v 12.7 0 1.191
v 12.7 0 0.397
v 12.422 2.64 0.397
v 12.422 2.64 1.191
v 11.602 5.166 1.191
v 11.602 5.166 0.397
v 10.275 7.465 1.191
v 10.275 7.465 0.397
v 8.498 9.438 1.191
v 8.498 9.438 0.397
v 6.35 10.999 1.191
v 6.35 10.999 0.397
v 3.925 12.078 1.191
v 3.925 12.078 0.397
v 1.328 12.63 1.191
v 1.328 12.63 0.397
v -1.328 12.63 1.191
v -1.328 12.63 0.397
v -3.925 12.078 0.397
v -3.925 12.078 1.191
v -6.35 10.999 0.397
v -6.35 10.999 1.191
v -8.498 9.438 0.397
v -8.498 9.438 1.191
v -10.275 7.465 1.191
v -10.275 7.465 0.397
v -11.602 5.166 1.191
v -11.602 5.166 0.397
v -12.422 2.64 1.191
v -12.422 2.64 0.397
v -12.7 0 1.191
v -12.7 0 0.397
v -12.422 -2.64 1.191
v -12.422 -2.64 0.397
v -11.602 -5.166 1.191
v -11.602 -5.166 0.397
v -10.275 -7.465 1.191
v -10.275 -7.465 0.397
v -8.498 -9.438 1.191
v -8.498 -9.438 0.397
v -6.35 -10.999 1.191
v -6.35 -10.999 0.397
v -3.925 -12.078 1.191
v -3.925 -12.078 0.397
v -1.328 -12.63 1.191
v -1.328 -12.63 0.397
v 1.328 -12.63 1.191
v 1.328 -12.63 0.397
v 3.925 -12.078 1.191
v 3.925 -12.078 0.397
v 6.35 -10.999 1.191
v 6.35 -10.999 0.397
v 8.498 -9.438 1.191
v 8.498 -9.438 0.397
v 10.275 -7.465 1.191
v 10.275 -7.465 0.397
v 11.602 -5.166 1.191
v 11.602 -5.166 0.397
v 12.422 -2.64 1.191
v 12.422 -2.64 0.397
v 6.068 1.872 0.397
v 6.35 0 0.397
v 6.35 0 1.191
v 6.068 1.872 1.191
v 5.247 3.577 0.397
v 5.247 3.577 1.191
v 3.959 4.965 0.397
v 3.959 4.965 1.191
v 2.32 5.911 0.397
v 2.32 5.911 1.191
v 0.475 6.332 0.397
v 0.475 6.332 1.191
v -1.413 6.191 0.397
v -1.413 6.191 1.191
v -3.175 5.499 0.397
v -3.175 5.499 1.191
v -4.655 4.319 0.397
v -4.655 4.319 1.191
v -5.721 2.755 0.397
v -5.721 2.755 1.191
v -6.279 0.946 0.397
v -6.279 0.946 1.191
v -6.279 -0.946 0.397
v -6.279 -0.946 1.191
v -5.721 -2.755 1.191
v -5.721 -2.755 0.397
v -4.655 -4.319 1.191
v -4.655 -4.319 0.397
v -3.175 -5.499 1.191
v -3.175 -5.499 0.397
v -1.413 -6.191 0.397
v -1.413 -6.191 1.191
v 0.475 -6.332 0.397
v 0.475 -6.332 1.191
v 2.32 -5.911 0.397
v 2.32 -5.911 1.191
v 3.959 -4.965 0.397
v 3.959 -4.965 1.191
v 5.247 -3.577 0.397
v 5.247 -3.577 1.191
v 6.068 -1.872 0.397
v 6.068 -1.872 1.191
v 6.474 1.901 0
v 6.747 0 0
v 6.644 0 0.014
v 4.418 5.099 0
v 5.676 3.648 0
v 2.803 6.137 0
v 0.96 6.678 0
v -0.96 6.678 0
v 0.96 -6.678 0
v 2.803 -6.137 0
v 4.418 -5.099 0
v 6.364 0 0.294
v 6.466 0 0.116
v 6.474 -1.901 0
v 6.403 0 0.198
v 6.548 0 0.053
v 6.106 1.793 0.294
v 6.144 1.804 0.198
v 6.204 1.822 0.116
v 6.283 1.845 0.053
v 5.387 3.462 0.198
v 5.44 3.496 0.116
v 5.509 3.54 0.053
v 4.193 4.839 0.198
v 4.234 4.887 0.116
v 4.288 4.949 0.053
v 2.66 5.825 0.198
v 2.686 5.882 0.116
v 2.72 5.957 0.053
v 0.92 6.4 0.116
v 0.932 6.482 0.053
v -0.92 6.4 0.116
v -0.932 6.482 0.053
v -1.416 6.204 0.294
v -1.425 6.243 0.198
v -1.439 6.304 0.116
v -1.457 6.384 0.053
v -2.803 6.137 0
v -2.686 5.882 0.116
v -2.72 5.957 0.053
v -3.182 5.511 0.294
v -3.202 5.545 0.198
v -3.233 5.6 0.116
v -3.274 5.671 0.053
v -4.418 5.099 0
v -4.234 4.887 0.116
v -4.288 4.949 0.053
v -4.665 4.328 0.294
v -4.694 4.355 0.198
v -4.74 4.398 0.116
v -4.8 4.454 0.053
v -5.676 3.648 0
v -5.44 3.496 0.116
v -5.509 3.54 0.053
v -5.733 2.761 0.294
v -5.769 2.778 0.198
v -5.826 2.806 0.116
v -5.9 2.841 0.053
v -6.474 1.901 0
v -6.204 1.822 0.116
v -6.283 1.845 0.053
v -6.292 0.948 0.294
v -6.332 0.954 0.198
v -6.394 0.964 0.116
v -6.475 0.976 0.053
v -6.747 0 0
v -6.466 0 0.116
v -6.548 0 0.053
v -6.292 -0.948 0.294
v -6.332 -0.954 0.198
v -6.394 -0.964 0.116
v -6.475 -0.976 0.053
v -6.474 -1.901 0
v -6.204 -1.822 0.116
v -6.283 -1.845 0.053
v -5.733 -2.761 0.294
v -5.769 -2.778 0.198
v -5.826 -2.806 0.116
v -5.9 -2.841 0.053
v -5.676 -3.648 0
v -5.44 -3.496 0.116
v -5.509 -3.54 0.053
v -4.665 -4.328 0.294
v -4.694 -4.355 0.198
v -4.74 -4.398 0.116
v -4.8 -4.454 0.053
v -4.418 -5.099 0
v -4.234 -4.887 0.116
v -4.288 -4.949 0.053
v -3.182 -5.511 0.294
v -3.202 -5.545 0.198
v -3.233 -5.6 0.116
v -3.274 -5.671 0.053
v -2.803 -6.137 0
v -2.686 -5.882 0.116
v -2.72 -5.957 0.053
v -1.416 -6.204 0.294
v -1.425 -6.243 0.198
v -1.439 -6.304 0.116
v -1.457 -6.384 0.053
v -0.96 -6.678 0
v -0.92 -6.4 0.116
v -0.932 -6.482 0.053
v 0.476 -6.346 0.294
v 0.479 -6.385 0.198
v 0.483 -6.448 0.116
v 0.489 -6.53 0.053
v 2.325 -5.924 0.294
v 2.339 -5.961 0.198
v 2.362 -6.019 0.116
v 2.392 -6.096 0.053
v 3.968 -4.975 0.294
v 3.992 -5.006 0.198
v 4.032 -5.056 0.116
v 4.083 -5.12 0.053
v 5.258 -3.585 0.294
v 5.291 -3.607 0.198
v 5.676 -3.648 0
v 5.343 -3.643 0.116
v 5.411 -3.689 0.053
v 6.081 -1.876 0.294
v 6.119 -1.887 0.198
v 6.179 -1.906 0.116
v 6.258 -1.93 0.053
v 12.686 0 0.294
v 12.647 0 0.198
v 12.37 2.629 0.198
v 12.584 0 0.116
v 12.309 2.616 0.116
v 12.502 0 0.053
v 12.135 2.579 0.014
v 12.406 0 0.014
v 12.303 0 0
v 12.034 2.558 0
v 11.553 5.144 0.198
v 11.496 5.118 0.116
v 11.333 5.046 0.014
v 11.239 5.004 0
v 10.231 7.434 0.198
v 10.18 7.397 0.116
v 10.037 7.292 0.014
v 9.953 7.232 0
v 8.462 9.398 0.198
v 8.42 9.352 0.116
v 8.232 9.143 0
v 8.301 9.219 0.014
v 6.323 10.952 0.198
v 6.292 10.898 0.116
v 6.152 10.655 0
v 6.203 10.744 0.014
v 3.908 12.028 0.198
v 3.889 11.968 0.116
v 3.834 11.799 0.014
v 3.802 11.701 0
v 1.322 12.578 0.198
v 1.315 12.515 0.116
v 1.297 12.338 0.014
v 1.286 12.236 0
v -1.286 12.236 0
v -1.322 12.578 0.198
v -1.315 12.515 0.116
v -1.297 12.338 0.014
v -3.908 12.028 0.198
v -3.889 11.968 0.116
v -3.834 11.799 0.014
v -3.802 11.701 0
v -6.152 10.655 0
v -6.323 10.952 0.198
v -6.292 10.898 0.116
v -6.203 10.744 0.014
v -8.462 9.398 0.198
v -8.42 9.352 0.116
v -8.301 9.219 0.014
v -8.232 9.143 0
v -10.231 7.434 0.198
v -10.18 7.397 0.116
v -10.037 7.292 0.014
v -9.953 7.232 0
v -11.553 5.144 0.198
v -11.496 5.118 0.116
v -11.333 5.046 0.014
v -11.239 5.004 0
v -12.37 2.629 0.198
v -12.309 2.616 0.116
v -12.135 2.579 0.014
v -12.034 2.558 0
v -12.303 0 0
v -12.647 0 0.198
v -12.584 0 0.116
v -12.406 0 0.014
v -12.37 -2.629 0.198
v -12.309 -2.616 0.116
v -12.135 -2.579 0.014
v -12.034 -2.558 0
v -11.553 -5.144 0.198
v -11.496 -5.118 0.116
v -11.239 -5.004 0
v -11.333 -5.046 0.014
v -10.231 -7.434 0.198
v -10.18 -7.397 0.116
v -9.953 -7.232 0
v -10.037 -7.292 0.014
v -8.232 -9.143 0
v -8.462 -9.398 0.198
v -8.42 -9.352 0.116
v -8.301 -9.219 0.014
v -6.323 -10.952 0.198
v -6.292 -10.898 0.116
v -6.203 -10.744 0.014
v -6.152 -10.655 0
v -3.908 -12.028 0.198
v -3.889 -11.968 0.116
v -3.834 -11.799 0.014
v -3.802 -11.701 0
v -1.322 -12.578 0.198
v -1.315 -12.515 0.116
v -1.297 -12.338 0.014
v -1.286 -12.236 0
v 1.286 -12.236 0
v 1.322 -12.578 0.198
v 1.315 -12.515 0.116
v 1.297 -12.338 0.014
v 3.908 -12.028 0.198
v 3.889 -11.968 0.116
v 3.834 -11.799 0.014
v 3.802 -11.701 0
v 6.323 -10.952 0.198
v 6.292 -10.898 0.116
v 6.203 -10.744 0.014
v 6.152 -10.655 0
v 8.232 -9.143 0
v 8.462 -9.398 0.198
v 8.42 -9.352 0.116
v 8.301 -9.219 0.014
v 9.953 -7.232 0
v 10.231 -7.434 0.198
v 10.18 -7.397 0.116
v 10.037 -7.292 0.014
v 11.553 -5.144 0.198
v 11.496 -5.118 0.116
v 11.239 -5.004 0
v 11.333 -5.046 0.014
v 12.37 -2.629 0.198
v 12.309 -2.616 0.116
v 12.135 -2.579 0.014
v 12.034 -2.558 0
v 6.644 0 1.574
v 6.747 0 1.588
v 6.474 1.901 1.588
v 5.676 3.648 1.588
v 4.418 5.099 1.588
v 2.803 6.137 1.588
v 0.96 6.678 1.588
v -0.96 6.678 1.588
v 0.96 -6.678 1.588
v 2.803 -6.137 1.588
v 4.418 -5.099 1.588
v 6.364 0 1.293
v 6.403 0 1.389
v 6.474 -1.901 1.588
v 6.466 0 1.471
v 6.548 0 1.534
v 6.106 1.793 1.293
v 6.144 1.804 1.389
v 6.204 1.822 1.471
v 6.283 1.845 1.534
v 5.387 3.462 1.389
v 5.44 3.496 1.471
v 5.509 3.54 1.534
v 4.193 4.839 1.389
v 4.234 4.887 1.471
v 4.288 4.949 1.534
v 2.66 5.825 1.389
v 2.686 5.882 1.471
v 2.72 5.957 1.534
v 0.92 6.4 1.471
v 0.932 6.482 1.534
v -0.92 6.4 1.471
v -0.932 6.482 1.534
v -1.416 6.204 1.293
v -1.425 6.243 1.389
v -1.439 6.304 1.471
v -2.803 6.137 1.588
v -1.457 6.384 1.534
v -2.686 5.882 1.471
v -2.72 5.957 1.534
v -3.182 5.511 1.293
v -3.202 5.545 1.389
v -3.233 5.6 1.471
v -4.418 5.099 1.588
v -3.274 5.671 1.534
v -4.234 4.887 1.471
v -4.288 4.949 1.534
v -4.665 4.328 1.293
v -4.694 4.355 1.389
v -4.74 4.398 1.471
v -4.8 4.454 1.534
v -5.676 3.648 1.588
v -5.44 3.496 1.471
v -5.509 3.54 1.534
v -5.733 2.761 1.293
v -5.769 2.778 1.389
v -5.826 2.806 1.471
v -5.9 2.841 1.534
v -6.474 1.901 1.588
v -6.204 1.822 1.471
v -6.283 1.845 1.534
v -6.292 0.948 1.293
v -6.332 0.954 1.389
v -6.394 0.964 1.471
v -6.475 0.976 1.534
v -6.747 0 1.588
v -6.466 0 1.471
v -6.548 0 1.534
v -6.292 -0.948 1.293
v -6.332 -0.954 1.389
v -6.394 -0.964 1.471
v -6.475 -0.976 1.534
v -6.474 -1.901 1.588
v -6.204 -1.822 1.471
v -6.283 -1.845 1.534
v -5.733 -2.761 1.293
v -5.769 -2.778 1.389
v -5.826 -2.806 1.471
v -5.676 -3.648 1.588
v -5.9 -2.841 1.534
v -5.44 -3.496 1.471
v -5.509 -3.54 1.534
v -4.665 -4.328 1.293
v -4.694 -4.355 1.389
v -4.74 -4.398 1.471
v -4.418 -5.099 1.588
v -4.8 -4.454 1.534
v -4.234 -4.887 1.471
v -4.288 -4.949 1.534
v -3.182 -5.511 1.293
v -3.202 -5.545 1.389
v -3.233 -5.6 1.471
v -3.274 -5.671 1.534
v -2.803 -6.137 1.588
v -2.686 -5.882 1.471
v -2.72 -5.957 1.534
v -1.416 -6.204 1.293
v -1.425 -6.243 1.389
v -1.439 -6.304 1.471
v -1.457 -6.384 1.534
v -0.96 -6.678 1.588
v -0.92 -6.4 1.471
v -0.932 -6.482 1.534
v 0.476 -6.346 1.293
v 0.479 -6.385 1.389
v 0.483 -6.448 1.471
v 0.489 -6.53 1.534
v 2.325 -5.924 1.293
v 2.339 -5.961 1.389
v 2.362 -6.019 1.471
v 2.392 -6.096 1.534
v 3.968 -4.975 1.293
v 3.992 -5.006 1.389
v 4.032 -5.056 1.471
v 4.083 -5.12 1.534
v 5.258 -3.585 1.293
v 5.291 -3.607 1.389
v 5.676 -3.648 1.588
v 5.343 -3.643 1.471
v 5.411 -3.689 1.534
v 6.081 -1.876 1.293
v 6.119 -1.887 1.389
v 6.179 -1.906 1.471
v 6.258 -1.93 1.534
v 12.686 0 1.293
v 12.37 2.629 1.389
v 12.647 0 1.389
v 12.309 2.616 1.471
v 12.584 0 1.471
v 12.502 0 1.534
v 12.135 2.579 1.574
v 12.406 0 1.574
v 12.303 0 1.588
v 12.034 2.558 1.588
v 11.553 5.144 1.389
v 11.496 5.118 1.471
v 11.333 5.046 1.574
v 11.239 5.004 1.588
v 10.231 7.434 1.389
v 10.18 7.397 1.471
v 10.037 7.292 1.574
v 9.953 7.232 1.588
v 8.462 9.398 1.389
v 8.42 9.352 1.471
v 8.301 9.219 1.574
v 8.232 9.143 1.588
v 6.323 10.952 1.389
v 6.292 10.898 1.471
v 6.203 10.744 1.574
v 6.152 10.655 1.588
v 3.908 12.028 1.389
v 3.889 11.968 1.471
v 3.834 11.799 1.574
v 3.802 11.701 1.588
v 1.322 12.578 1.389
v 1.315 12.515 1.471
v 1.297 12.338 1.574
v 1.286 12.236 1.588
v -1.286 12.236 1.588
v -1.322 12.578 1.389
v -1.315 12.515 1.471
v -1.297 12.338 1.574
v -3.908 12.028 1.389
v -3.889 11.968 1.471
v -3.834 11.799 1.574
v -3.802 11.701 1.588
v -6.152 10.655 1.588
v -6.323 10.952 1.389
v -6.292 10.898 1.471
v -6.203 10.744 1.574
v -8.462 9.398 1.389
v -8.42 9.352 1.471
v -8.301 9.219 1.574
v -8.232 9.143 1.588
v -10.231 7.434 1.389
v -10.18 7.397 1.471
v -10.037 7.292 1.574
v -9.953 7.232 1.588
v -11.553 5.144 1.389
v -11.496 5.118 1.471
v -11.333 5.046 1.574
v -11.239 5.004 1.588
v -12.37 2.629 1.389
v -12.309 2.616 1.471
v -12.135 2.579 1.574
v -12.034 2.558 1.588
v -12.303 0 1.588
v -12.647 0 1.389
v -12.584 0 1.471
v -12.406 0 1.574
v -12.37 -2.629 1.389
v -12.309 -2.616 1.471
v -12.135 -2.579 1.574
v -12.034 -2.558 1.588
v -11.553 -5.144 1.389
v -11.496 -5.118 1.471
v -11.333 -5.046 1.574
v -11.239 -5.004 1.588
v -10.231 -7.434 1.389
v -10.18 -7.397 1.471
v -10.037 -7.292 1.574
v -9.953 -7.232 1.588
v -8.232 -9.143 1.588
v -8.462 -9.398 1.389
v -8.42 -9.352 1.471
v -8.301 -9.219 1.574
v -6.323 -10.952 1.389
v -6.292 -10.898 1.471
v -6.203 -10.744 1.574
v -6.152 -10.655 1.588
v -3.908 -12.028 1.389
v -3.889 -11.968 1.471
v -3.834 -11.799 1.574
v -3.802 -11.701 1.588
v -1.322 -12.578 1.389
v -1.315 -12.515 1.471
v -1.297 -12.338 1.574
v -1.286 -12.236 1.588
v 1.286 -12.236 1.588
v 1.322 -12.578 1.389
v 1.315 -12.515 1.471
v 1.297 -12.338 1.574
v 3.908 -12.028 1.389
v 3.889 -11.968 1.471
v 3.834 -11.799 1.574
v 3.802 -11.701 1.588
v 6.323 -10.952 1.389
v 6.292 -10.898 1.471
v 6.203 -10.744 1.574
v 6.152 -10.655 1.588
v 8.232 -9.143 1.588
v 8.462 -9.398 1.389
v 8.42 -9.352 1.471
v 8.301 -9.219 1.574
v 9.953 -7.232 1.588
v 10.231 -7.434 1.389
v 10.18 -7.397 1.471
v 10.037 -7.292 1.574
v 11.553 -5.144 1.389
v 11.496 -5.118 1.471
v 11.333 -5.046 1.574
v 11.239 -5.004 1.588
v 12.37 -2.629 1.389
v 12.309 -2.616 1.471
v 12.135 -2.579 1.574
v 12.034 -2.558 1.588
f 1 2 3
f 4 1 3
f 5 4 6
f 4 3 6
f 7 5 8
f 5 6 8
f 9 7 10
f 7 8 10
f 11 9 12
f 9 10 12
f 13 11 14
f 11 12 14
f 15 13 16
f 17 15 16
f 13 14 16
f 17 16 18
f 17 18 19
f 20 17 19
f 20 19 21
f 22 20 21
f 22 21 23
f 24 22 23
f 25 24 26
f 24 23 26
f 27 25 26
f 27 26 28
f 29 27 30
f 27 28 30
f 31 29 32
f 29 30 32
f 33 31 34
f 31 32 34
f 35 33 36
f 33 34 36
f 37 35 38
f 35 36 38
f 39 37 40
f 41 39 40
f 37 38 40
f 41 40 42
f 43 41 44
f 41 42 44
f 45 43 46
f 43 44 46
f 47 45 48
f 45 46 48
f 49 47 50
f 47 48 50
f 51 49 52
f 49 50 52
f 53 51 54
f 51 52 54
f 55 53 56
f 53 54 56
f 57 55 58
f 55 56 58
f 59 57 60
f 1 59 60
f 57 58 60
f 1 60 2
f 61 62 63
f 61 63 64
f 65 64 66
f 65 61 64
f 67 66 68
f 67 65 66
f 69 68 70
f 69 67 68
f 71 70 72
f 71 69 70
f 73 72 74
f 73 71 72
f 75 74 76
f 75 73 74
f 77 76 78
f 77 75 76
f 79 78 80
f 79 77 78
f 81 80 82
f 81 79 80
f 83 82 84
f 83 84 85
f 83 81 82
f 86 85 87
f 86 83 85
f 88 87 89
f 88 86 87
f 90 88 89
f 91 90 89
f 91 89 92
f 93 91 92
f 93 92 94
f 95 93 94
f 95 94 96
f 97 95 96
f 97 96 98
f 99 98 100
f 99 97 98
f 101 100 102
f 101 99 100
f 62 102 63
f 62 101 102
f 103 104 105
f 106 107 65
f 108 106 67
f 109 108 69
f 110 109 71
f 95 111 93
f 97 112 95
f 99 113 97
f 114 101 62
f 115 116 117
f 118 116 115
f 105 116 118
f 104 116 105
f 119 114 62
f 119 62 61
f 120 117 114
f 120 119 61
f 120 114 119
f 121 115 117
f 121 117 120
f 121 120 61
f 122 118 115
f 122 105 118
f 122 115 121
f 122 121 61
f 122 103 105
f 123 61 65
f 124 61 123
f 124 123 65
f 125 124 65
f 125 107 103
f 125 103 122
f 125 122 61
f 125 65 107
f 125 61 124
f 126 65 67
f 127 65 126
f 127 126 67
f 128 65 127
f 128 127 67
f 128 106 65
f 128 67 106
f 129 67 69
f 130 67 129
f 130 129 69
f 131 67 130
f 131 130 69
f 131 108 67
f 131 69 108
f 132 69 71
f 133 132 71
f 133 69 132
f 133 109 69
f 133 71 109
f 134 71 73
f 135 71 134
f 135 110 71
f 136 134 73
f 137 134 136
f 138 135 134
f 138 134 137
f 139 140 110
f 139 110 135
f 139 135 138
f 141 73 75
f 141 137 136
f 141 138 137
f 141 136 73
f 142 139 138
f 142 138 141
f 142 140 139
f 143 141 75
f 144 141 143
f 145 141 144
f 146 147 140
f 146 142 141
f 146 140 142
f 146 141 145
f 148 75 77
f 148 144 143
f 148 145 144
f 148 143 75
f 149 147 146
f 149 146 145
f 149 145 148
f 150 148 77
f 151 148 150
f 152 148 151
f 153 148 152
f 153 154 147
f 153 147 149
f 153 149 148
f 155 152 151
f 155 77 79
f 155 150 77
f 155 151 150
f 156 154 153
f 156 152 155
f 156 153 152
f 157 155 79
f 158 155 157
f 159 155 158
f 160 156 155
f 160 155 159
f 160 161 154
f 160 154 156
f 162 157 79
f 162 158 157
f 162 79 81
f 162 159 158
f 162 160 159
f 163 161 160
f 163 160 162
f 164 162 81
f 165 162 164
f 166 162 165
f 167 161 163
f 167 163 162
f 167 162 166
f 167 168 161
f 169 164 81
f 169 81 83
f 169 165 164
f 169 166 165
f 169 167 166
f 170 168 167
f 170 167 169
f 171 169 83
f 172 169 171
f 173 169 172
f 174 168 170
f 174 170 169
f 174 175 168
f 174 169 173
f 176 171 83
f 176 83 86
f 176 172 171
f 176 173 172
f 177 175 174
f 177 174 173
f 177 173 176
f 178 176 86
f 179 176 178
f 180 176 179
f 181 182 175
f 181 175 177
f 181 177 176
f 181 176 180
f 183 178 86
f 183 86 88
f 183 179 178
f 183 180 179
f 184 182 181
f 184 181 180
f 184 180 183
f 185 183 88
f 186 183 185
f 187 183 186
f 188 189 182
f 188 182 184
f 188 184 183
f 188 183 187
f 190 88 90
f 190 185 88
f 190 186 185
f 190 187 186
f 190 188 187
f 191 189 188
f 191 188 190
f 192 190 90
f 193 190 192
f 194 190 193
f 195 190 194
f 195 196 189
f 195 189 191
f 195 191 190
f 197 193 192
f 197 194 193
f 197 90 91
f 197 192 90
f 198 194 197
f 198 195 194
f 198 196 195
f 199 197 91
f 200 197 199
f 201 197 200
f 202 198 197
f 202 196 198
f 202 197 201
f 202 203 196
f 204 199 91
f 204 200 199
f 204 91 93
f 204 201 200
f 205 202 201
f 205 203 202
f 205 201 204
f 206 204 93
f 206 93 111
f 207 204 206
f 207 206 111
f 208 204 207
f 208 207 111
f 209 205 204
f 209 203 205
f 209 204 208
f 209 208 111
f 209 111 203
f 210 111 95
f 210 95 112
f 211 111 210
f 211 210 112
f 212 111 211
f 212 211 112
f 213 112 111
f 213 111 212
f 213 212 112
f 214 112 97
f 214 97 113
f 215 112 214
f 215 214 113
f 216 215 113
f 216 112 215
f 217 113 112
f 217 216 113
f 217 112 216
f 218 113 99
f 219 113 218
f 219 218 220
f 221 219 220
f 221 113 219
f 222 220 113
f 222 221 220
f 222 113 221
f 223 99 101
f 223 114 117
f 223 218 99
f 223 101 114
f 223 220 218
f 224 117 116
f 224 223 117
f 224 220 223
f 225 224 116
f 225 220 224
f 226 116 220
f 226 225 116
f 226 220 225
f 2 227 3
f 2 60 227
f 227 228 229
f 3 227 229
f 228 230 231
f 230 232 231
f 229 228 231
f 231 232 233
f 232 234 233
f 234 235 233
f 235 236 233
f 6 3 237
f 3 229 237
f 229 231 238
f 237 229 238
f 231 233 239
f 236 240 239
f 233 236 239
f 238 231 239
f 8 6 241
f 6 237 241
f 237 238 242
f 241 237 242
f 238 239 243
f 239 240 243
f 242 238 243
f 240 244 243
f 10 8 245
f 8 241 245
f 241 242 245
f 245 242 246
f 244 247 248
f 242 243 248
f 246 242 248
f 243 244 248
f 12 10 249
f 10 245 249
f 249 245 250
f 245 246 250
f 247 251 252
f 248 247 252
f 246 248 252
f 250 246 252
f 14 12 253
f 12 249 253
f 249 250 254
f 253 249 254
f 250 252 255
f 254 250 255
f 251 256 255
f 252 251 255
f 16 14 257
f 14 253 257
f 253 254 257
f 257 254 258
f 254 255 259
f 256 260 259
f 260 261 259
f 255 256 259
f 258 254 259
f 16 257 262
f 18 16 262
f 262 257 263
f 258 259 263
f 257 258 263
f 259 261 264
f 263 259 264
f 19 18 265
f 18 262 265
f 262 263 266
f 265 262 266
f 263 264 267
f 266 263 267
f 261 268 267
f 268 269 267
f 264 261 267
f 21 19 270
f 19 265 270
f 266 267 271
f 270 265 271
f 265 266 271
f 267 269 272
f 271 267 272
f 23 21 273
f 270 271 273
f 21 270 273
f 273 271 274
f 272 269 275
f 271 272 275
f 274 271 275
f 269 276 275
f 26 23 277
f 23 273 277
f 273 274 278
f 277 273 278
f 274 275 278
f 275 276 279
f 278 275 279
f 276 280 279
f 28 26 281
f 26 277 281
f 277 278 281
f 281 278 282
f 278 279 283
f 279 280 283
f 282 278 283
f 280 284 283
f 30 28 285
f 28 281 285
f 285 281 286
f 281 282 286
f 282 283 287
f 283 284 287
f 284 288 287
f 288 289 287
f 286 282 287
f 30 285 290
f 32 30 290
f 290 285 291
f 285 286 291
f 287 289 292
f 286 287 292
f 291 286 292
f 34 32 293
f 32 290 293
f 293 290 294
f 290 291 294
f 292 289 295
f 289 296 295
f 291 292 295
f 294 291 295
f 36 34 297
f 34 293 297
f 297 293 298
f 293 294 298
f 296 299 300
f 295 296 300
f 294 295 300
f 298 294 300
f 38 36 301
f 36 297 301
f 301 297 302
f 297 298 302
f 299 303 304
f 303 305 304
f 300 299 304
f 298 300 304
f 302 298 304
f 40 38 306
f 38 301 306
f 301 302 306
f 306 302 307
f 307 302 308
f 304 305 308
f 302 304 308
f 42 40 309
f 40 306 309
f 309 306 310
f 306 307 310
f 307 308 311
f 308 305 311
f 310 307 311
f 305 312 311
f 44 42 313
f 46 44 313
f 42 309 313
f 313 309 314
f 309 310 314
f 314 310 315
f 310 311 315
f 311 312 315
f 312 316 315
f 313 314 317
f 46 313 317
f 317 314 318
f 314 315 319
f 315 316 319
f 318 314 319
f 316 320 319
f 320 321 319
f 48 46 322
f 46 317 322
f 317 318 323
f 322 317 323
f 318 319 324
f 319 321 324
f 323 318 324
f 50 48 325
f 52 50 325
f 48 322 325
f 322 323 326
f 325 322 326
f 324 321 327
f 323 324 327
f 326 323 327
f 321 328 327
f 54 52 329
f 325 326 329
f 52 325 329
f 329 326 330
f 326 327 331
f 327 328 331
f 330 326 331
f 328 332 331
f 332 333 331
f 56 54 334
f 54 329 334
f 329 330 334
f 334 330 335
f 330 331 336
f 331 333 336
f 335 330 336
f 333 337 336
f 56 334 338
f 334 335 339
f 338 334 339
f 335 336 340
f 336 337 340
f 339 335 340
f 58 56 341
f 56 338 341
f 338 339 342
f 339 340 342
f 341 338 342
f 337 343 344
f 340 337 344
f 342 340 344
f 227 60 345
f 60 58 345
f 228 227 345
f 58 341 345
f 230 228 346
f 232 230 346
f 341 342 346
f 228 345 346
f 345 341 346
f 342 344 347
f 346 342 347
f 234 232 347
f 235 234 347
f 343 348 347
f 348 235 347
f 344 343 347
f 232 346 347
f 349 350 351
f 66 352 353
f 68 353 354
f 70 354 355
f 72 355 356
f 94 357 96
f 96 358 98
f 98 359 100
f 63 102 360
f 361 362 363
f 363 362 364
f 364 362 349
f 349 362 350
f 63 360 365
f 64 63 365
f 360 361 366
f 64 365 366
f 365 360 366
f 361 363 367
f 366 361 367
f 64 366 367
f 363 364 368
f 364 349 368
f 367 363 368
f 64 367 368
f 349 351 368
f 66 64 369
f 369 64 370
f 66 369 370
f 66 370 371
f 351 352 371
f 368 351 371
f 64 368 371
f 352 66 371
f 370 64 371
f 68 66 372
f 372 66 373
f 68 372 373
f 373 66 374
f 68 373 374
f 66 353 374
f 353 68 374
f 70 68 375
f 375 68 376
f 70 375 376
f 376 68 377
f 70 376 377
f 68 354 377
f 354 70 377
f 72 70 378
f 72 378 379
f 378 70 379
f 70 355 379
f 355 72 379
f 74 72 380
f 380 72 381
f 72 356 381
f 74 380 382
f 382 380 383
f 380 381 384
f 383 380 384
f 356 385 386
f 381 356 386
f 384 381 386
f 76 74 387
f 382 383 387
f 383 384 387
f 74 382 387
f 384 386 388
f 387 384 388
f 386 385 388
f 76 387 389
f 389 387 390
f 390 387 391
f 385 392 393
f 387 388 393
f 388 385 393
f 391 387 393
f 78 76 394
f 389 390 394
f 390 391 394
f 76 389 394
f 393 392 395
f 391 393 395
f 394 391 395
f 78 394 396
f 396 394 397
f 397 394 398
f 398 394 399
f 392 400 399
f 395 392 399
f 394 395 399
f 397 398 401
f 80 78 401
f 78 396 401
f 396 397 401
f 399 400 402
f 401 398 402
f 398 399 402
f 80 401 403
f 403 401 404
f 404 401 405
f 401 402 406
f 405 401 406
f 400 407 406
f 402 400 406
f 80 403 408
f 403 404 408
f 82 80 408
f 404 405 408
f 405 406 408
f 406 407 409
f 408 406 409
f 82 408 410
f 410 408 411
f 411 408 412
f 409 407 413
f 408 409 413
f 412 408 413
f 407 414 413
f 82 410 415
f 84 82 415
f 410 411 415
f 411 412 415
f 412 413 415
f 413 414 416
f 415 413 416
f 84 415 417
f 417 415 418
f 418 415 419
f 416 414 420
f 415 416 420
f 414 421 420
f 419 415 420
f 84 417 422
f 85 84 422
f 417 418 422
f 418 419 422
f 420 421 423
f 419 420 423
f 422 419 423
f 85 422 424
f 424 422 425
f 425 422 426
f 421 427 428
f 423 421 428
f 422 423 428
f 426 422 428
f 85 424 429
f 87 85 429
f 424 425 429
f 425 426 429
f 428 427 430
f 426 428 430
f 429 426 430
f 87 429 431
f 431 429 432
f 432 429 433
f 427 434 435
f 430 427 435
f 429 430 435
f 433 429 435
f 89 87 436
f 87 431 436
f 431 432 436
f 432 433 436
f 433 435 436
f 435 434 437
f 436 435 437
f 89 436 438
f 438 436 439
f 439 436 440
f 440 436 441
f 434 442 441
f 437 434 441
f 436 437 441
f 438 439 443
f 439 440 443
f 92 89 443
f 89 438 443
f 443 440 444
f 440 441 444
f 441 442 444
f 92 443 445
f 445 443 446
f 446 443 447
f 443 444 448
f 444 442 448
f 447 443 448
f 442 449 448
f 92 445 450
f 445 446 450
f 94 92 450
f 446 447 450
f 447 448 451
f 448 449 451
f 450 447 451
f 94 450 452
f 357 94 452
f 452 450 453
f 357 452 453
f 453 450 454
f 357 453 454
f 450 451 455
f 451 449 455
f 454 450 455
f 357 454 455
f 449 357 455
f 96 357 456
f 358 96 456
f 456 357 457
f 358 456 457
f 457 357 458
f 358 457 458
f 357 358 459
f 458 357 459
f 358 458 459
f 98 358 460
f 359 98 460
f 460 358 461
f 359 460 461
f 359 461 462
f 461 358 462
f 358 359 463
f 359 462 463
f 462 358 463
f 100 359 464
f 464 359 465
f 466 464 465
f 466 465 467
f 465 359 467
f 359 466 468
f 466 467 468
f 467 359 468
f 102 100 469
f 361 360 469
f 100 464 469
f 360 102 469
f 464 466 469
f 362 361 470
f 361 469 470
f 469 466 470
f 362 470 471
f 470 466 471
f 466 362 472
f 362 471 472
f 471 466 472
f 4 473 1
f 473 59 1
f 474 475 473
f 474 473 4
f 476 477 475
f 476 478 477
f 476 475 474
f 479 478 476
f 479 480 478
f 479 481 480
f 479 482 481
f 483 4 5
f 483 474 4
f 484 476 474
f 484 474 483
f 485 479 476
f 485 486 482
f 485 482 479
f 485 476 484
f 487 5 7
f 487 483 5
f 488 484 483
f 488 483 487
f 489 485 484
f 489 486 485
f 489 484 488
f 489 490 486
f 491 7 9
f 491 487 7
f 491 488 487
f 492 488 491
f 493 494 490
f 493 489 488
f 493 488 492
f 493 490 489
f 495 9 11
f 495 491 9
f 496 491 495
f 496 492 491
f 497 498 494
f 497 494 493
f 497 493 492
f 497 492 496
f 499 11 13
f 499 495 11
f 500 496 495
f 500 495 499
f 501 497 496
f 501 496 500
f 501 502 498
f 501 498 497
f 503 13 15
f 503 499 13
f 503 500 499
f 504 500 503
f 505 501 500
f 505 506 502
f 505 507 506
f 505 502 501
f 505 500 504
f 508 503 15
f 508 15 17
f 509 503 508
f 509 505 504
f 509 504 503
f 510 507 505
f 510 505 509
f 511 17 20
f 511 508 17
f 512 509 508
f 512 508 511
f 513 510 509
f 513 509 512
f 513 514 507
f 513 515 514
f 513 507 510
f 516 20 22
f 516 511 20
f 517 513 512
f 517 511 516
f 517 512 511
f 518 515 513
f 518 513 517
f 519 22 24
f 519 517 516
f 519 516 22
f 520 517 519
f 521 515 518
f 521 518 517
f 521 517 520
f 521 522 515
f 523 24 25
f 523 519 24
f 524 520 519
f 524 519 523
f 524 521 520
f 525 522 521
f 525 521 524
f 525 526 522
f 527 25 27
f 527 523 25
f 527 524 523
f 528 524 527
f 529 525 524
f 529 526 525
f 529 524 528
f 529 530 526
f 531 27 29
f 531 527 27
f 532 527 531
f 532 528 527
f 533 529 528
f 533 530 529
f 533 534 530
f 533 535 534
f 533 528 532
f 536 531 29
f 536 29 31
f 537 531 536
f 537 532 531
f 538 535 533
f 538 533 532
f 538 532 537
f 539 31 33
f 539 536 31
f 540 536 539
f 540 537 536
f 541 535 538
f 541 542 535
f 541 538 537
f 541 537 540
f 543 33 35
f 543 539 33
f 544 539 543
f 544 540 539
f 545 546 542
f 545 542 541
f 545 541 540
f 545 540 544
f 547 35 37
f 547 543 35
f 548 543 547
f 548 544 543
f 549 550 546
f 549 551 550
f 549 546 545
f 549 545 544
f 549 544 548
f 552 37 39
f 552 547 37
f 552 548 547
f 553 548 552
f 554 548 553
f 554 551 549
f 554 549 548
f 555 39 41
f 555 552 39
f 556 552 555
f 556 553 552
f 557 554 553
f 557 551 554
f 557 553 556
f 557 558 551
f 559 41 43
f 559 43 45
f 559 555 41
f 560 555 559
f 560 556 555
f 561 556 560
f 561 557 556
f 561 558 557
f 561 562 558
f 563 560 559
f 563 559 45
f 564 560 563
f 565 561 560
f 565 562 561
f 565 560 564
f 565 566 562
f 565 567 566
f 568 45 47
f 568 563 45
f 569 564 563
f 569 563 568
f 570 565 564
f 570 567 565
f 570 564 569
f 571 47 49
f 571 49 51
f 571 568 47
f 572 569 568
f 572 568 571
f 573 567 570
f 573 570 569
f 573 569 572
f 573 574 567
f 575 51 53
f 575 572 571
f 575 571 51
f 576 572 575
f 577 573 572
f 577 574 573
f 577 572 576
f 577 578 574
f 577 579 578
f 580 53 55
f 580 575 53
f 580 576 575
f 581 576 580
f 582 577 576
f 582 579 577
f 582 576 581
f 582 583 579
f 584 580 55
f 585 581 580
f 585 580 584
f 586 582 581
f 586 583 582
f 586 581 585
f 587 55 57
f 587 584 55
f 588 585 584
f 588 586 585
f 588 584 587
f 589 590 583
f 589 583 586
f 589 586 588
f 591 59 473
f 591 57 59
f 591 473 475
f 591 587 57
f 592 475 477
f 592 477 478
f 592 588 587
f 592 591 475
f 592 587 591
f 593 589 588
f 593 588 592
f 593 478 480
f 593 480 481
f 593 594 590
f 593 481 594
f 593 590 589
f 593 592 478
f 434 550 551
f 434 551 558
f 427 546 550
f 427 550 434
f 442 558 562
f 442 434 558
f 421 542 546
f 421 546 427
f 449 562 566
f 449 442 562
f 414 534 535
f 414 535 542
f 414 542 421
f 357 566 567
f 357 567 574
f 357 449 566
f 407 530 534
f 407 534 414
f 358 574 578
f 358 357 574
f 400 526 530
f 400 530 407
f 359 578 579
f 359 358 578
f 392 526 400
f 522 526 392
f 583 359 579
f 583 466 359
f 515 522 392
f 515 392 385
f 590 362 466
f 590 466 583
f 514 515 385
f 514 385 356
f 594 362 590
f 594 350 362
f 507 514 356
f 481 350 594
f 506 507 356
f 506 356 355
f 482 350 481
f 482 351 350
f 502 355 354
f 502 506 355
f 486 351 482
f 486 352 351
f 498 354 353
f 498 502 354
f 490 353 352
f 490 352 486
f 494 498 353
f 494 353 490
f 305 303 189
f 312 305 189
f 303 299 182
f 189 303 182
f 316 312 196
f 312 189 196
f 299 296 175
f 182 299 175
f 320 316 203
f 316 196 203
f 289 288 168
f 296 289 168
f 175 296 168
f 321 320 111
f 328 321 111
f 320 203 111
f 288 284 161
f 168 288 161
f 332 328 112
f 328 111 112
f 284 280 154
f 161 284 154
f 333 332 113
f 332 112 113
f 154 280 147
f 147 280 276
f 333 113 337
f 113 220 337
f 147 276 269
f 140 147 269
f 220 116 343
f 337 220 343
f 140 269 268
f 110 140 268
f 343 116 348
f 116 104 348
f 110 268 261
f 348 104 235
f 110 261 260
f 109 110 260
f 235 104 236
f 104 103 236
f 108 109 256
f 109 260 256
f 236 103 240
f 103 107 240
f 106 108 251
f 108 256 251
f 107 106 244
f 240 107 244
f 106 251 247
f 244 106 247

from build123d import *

# Parameters (mm, degrees)
F0_R     = 12.7
F0_R_2   = 6.35
F1_DEPTH = 1.5875
F2_R     = 0.396875


with BuildPart() as f1:
    # F0 (on Top) → F1 (new body)
    with BuildSketch(Plane.XY):
        Circle(F0_R)
        Circle(F0_R_2, mode=Mode.SUBTRACT)
    extrude(amount=F1_DEPTH)

    # F2
    f2_edges = [f1.edges().sort_by_distance(p)[0] for p in [
        (-12.7, 0, 0),
        (-6.35, 0, 0),
        (-12.7, 0, 1.5875),
        (12.7, 0, 0.79375),
        (-6.35, 0, 1.5875),
        (6.35, 0, 0.79375),
    ]]
    fillet(f2_edges, radius=F2_R)


solid = f1.part
